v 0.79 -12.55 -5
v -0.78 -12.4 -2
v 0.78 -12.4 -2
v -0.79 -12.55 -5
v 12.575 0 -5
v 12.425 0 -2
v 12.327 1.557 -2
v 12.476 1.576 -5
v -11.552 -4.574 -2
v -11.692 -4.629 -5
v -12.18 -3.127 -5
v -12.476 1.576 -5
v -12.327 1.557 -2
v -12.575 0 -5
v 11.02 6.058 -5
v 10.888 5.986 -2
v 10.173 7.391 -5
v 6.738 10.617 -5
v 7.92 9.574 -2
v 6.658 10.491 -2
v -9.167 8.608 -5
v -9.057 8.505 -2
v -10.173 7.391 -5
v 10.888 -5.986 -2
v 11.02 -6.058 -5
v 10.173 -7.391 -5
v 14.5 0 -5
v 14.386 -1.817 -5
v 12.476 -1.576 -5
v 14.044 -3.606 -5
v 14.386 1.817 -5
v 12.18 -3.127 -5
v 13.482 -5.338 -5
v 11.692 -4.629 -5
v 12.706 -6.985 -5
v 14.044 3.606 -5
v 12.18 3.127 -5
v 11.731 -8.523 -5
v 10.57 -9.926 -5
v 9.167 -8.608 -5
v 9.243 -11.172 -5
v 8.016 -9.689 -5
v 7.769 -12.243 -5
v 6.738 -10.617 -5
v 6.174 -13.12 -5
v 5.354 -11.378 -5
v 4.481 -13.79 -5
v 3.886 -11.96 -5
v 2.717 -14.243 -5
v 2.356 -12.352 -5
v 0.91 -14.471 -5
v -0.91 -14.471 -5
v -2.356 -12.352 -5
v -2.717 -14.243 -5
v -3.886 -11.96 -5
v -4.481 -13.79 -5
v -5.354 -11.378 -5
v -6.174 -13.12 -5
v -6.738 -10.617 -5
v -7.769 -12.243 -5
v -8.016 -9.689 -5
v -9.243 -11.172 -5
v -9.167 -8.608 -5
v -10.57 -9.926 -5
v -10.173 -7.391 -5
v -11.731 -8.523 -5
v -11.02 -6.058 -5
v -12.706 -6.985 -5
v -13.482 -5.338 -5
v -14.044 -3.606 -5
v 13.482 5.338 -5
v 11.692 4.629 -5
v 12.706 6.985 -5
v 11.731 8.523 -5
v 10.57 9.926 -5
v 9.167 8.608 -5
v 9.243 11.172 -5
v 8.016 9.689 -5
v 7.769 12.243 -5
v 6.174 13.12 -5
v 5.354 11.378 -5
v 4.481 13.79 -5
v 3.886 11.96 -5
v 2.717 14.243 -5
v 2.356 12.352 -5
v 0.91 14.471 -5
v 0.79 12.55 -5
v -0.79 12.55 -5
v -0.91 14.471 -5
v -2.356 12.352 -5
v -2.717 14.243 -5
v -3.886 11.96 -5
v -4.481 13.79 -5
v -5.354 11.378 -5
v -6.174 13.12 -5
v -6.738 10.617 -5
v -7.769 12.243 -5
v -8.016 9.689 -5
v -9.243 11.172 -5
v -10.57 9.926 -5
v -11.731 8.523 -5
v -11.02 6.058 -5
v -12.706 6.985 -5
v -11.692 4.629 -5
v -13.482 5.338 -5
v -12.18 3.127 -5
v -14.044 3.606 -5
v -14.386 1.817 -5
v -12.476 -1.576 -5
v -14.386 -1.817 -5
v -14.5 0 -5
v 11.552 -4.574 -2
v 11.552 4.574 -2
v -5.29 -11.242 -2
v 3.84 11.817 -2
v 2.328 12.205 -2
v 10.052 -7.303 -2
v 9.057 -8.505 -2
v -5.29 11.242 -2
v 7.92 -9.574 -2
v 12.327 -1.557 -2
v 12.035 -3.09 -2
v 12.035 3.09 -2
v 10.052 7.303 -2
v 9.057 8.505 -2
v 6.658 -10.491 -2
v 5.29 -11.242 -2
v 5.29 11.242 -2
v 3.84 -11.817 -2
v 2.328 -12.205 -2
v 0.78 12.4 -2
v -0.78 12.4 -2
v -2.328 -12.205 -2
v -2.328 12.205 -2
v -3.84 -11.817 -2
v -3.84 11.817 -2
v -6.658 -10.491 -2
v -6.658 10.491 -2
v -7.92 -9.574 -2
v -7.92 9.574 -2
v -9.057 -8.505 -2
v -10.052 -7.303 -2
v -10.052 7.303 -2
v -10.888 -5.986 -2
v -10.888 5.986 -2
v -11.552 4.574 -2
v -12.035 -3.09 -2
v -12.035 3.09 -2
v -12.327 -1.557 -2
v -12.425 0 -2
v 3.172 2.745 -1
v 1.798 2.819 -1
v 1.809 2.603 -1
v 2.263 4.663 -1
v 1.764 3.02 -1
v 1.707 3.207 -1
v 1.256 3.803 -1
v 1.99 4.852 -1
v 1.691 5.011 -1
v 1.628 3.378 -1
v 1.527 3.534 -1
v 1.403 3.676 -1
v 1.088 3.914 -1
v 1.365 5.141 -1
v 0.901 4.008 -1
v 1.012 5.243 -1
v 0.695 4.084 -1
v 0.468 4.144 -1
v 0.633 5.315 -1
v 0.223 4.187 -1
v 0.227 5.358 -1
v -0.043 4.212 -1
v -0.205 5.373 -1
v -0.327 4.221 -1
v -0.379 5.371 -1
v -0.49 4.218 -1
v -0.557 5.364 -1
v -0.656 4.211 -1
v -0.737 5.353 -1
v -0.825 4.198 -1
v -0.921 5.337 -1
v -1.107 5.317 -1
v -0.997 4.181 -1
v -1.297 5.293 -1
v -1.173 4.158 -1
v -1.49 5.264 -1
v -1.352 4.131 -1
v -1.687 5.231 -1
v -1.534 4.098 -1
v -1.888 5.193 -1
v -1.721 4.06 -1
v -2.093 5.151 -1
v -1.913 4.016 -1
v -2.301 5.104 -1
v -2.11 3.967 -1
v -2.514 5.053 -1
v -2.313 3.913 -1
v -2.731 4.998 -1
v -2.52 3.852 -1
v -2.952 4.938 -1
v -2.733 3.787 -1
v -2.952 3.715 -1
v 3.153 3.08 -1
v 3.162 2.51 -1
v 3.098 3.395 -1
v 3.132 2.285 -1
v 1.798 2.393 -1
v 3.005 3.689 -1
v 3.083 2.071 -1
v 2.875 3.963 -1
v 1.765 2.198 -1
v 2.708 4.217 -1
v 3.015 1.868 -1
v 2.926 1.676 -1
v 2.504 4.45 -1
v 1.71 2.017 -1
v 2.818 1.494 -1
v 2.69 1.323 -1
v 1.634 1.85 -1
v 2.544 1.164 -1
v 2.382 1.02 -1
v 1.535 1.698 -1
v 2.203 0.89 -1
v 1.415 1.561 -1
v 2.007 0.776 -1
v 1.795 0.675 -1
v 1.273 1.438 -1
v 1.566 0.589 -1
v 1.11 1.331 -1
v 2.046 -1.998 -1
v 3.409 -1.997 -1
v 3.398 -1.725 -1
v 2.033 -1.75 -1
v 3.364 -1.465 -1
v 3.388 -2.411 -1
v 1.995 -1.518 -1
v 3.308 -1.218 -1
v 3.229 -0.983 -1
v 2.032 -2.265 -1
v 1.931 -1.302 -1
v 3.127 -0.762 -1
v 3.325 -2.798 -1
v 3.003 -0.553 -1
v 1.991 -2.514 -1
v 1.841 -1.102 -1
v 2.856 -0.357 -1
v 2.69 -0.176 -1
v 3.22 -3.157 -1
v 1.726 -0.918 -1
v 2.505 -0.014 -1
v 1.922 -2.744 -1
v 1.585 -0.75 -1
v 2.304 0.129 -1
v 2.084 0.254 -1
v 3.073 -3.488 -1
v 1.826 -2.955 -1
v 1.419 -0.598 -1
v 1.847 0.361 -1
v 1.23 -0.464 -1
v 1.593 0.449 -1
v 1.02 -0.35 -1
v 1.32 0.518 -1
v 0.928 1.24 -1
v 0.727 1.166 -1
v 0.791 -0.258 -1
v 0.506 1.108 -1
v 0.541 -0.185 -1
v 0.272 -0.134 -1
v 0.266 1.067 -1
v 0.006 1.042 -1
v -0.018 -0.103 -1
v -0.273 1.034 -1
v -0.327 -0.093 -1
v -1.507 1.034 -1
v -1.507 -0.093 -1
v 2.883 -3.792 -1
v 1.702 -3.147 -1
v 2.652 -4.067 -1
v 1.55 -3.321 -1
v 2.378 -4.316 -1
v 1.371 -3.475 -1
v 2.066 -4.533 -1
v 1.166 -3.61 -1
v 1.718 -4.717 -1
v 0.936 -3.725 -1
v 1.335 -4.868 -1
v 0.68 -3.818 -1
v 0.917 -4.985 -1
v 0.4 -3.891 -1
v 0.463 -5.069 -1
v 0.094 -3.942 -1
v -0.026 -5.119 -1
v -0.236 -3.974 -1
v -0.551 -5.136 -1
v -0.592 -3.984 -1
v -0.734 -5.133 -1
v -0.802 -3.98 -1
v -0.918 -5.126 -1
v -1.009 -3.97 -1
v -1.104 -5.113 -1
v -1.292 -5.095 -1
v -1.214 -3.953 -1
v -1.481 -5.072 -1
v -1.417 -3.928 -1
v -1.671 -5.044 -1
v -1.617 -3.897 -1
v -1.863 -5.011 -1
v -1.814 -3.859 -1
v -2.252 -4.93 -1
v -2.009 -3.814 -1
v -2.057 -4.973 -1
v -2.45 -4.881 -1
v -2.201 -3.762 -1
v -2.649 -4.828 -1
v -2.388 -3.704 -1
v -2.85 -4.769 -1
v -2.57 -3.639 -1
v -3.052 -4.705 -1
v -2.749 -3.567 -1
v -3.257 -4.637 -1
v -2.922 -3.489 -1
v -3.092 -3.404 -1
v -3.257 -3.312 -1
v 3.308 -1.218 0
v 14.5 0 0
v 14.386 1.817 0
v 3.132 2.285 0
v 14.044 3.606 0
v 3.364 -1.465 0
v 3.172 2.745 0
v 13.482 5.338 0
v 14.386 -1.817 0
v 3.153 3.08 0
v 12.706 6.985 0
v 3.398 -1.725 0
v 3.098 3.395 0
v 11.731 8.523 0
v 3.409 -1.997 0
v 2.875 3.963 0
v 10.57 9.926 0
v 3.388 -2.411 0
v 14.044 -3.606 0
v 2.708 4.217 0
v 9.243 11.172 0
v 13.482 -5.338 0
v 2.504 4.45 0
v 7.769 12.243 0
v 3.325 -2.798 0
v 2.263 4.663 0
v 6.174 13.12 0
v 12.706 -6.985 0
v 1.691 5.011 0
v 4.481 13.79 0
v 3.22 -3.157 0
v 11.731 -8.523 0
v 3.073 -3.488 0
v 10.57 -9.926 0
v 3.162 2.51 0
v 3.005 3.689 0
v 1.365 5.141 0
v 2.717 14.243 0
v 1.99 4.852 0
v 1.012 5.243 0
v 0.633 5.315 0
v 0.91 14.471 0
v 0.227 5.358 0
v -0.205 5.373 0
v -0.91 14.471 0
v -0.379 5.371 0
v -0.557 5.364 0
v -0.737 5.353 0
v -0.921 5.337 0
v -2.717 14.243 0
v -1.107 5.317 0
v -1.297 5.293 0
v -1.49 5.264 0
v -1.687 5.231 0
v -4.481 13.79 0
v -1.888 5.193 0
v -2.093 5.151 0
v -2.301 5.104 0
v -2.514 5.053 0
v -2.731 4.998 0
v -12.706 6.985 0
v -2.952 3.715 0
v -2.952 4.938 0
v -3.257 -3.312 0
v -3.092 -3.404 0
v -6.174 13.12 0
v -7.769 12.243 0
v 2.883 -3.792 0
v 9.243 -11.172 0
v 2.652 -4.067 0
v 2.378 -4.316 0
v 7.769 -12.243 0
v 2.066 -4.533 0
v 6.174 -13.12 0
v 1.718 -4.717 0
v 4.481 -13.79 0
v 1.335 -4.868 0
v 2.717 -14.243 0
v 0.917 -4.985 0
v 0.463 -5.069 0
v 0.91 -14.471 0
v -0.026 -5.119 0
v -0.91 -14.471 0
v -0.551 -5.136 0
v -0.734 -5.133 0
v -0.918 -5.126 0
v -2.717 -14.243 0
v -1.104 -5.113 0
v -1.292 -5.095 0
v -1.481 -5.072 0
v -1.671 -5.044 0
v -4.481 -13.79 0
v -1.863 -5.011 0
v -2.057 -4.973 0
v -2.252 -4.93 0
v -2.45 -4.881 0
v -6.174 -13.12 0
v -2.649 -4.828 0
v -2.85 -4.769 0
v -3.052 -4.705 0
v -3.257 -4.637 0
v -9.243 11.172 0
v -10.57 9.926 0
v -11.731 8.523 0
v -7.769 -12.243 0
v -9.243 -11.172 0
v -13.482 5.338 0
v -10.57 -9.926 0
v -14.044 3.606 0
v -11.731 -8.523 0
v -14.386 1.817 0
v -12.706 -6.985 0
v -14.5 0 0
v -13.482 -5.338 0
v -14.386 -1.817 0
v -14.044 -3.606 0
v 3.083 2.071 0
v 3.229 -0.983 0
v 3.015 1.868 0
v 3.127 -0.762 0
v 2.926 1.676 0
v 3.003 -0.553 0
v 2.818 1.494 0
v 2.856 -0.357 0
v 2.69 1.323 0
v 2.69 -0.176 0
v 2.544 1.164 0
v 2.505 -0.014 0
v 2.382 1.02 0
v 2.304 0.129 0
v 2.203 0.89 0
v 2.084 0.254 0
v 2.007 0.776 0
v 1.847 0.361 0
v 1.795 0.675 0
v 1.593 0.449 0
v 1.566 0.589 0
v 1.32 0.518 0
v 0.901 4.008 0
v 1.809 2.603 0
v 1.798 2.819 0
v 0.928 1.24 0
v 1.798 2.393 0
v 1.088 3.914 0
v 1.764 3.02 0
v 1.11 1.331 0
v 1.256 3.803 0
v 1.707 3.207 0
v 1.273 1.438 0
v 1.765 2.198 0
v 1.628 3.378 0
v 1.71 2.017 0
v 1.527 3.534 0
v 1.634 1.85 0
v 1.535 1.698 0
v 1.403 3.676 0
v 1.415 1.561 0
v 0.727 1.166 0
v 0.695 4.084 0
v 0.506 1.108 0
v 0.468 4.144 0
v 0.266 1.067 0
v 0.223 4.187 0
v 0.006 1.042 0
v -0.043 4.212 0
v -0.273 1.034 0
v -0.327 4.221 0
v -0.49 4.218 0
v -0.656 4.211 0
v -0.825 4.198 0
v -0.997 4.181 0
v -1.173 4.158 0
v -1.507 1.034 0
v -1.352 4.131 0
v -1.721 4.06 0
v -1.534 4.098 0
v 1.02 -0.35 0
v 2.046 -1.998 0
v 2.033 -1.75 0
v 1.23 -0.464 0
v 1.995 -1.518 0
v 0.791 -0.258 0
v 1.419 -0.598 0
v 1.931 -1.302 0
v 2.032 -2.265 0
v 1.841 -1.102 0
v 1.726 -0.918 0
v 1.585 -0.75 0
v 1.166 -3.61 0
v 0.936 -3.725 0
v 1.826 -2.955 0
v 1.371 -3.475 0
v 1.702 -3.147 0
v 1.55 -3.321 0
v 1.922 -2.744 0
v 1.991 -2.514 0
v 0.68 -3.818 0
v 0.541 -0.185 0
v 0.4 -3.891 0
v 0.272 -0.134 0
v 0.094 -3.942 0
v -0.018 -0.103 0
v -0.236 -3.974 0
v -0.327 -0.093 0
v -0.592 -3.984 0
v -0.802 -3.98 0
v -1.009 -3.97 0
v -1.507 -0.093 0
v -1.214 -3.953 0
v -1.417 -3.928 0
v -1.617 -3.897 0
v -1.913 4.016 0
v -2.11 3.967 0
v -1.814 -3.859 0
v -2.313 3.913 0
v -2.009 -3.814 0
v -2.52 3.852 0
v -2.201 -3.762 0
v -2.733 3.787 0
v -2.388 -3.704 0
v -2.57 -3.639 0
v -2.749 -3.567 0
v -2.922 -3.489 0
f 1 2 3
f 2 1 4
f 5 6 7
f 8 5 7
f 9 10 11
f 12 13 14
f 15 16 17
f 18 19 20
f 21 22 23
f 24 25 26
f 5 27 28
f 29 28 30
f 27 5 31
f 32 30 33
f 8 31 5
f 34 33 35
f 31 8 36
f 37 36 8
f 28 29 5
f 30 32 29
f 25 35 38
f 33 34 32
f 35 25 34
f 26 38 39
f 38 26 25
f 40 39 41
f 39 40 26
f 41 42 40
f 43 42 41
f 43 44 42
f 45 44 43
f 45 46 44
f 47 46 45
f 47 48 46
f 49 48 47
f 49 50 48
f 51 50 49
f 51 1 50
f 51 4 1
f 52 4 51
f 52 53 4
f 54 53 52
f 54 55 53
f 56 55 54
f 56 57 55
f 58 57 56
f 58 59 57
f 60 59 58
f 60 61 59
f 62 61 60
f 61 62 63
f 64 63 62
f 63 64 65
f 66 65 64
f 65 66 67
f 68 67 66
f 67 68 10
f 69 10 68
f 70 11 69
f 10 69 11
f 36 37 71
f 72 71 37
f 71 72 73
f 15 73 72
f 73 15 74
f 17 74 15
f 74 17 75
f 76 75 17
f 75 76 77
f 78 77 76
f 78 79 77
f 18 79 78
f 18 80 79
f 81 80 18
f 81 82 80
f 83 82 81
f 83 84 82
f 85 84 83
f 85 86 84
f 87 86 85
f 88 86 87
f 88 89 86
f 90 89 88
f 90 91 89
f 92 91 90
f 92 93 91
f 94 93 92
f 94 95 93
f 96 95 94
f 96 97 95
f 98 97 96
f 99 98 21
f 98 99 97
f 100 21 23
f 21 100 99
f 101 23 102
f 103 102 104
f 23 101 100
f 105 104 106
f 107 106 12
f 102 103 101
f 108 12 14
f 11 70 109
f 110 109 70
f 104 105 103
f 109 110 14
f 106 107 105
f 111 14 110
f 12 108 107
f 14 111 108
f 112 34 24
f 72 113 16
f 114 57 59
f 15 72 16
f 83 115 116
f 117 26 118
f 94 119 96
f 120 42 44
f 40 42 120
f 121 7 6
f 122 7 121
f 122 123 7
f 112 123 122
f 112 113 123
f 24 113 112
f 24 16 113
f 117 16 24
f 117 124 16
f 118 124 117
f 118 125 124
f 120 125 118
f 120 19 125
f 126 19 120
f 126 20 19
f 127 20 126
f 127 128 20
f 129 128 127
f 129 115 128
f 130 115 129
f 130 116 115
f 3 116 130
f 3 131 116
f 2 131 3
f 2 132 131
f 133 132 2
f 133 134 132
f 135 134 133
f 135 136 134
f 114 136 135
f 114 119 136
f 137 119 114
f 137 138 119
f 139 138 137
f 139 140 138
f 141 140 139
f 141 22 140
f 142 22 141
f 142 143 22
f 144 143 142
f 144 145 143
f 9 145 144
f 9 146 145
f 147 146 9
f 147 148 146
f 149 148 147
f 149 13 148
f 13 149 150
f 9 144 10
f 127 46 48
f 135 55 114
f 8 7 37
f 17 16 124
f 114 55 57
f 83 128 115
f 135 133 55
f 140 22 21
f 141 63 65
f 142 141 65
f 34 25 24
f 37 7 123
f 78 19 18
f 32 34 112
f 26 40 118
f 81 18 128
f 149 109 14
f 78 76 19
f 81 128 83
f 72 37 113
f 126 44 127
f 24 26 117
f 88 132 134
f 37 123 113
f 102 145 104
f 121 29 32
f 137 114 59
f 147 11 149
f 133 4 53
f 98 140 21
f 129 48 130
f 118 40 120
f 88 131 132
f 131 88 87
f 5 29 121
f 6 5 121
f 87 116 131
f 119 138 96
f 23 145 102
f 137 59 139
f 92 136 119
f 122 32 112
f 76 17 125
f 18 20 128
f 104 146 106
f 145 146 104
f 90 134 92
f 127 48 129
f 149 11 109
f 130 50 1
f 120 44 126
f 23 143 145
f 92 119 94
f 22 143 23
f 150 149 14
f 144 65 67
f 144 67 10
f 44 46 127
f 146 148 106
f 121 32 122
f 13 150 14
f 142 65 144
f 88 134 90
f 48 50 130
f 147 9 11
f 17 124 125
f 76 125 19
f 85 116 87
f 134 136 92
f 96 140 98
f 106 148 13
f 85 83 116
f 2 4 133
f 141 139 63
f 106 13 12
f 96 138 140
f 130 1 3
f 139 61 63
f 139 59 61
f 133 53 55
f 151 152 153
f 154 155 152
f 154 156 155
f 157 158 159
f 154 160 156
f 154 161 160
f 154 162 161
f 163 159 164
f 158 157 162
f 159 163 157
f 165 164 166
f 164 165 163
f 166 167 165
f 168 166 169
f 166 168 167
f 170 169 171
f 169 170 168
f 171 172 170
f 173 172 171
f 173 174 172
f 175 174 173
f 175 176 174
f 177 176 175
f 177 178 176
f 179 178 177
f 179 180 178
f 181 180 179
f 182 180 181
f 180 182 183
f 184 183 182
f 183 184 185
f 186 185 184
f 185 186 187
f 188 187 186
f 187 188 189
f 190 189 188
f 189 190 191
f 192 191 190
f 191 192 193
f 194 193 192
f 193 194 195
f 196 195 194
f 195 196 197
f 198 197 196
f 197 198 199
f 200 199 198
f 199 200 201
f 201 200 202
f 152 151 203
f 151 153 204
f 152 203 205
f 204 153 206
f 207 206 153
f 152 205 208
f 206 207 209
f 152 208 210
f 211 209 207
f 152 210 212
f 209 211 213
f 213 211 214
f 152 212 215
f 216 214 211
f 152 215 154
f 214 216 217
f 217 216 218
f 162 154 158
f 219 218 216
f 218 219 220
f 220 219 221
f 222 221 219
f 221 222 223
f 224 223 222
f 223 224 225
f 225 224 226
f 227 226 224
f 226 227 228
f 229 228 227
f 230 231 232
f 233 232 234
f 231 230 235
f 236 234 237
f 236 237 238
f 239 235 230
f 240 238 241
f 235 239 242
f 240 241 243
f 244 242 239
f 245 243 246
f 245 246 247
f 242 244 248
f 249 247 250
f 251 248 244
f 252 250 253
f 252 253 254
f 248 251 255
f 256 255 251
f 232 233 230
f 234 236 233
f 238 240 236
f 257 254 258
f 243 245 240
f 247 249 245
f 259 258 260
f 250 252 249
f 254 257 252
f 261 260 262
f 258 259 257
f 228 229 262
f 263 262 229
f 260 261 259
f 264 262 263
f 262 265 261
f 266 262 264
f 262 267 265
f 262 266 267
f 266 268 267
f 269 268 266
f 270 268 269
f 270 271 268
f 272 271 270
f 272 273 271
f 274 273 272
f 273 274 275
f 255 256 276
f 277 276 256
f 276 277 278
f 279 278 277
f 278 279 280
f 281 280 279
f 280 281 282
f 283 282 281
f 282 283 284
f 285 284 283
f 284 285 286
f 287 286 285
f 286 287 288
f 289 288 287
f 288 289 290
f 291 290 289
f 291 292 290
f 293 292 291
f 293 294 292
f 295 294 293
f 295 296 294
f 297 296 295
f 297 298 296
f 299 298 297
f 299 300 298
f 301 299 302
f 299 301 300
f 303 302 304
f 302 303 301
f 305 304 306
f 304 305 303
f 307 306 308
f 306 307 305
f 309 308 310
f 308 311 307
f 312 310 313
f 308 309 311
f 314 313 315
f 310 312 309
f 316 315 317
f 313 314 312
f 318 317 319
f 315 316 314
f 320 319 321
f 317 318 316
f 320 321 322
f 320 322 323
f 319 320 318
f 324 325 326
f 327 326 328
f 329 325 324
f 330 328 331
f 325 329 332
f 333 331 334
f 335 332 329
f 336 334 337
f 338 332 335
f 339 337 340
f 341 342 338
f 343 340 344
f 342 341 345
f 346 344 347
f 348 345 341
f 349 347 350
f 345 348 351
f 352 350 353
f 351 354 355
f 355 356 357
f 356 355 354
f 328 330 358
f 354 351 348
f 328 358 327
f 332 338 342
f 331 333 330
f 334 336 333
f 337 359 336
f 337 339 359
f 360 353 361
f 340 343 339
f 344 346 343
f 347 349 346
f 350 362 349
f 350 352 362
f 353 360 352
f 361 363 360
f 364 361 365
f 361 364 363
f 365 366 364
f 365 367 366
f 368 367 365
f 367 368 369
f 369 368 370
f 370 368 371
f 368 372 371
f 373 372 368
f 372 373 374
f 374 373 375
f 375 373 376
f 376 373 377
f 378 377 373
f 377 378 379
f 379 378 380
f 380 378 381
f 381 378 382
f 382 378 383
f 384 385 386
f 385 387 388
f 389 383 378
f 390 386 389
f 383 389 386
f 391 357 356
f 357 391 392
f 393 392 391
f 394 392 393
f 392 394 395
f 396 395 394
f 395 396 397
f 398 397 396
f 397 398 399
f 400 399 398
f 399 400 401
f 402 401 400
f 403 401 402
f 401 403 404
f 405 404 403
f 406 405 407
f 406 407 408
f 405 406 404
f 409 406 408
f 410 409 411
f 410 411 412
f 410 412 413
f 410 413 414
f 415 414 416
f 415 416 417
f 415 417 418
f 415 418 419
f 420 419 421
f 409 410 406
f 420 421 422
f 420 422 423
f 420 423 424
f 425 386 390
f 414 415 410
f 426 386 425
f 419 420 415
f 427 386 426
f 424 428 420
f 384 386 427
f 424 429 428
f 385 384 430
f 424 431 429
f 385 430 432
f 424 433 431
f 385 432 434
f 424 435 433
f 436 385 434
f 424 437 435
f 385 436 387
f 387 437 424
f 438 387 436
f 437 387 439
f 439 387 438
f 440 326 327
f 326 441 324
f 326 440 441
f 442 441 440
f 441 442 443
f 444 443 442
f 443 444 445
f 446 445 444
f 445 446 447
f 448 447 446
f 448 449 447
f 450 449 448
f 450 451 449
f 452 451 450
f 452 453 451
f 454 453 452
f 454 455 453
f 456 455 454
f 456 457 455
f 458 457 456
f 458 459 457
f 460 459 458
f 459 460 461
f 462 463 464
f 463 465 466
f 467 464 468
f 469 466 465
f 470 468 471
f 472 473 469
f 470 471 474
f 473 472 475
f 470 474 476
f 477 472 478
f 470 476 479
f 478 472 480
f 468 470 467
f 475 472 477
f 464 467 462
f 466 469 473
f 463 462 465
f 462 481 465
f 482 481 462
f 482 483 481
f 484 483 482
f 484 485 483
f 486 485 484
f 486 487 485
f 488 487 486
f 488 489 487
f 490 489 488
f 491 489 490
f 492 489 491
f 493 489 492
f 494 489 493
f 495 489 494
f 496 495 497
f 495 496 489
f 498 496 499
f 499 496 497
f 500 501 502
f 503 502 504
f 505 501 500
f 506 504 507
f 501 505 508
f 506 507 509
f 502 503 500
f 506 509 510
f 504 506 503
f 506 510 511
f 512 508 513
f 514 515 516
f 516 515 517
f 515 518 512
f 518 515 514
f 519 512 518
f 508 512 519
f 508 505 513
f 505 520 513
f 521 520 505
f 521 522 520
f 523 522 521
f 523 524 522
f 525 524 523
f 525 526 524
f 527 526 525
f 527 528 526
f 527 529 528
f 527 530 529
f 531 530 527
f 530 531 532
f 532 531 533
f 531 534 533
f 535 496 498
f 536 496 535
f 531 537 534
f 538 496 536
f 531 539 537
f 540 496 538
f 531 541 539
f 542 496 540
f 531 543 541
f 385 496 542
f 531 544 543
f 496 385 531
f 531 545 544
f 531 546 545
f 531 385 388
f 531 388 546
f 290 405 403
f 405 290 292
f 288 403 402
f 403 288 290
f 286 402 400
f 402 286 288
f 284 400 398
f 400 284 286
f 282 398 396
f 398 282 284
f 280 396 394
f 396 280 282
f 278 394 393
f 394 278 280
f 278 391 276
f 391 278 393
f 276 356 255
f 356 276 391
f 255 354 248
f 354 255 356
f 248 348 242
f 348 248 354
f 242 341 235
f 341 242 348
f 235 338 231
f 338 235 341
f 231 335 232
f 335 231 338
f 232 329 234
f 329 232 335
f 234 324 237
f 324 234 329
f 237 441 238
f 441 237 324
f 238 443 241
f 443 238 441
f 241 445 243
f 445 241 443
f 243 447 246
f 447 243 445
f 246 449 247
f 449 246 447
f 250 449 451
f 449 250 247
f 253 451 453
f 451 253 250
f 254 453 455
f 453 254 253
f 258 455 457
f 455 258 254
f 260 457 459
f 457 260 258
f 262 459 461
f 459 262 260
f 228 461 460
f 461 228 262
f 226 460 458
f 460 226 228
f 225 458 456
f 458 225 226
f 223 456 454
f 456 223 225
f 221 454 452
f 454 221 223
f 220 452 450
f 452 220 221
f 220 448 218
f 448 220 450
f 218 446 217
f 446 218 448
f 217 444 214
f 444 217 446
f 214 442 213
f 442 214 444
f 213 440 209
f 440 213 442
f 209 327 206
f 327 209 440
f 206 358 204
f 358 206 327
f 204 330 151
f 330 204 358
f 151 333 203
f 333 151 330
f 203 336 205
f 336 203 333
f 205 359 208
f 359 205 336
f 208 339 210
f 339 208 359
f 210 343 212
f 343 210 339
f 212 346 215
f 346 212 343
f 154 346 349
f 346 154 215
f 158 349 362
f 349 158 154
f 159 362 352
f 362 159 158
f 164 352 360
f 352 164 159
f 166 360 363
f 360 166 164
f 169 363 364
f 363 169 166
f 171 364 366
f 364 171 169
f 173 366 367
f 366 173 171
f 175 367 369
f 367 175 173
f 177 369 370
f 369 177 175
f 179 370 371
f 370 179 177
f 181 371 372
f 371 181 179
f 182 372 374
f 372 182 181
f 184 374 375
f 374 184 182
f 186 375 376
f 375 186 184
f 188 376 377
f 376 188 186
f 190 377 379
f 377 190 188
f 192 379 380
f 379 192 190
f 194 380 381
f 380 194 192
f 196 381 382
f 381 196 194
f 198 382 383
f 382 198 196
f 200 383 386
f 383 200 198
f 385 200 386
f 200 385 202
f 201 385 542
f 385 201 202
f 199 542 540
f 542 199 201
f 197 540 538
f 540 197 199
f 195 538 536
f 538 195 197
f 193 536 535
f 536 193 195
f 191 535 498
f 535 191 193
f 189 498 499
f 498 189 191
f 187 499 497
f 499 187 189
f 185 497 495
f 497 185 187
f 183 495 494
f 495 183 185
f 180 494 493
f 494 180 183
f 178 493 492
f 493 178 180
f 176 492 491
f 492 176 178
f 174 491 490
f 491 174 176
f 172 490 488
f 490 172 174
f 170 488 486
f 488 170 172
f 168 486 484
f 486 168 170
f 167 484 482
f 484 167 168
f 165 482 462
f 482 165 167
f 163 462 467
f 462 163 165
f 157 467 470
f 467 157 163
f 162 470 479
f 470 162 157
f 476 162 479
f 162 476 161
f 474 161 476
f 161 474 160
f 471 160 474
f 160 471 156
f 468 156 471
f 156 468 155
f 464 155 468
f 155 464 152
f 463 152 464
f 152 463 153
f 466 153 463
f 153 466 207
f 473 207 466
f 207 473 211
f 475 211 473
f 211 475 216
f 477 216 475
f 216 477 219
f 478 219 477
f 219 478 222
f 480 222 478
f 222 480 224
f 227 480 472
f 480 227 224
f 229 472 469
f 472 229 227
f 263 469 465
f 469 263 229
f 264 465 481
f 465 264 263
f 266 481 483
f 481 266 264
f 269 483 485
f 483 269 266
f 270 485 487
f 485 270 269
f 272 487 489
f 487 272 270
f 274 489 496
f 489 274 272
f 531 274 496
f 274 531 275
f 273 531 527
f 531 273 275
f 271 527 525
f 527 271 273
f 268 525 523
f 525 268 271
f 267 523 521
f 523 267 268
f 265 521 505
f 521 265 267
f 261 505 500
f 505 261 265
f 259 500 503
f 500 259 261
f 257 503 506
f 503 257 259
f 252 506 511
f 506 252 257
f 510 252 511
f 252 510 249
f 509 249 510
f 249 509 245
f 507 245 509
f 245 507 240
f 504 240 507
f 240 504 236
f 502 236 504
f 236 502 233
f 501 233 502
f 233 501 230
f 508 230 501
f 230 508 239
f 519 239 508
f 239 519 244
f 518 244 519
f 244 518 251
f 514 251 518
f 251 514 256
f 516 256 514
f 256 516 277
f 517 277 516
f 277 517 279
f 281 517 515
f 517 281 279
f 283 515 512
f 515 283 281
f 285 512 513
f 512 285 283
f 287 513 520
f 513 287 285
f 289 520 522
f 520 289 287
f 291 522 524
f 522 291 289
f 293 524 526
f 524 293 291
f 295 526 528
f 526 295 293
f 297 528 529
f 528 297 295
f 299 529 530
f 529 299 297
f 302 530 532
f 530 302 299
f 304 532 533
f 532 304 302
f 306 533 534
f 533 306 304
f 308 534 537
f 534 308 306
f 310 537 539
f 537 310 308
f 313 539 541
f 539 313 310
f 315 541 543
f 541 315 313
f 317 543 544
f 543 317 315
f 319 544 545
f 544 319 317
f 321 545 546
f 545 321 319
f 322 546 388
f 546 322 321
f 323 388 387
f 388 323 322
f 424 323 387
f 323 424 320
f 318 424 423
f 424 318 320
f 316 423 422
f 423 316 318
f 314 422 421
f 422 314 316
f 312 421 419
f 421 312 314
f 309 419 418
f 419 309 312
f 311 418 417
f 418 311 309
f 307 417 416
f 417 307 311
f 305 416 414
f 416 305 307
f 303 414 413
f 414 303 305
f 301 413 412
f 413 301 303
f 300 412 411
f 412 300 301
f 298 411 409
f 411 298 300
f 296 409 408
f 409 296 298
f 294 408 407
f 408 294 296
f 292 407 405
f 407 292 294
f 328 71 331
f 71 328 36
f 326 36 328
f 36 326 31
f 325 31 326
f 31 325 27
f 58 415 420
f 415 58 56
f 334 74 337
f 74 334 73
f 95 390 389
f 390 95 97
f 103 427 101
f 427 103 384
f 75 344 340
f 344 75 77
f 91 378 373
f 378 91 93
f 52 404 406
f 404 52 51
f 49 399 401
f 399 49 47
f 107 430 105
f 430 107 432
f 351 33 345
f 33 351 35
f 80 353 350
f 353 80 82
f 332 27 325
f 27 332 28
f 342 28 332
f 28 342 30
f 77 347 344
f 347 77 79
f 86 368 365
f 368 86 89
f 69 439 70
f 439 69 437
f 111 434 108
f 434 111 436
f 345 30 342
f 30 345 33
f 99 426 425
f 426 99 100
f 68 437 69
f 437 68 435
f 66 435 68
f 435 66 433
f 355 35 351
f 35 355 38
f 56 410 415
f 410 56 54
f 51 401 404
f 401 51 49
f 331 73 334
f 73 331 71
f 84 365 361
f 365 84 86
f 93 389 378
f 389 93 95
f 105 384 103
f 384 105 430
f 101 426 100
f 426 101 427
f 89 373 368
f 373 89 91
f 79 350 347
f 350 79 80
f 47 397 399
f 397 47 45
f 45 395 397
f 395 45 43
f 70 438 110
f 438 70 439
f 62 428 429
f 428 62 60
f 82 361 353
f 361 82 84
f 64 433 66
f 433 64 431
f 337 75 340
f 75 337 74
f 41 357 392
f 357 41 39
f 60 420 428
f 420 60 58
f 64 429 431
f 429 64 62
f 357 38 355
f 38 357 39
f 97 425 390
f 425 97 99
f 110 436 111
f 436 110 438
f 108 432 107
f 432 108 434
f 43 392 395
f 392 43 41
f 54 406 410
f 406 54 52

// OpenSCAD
$fn = 50;

difference() {
	union() {
		translate(v = [0, 0, -5.0]) {
			cylinder(h = 5, r = 14.5);
		}
	}
	union() {
		#translate(v = [0, 0, -5.0]) {
			cylinder(h = 3, r1 = 12.575, r2 = 12.425);
		}
		translate(v = [0, 0, -1]) {
			linear_extrude(height = 1) {
				text(font = "Impact", halign = "center", size = 10, text = "3", valign = "center");
			}
		}
	}
}
